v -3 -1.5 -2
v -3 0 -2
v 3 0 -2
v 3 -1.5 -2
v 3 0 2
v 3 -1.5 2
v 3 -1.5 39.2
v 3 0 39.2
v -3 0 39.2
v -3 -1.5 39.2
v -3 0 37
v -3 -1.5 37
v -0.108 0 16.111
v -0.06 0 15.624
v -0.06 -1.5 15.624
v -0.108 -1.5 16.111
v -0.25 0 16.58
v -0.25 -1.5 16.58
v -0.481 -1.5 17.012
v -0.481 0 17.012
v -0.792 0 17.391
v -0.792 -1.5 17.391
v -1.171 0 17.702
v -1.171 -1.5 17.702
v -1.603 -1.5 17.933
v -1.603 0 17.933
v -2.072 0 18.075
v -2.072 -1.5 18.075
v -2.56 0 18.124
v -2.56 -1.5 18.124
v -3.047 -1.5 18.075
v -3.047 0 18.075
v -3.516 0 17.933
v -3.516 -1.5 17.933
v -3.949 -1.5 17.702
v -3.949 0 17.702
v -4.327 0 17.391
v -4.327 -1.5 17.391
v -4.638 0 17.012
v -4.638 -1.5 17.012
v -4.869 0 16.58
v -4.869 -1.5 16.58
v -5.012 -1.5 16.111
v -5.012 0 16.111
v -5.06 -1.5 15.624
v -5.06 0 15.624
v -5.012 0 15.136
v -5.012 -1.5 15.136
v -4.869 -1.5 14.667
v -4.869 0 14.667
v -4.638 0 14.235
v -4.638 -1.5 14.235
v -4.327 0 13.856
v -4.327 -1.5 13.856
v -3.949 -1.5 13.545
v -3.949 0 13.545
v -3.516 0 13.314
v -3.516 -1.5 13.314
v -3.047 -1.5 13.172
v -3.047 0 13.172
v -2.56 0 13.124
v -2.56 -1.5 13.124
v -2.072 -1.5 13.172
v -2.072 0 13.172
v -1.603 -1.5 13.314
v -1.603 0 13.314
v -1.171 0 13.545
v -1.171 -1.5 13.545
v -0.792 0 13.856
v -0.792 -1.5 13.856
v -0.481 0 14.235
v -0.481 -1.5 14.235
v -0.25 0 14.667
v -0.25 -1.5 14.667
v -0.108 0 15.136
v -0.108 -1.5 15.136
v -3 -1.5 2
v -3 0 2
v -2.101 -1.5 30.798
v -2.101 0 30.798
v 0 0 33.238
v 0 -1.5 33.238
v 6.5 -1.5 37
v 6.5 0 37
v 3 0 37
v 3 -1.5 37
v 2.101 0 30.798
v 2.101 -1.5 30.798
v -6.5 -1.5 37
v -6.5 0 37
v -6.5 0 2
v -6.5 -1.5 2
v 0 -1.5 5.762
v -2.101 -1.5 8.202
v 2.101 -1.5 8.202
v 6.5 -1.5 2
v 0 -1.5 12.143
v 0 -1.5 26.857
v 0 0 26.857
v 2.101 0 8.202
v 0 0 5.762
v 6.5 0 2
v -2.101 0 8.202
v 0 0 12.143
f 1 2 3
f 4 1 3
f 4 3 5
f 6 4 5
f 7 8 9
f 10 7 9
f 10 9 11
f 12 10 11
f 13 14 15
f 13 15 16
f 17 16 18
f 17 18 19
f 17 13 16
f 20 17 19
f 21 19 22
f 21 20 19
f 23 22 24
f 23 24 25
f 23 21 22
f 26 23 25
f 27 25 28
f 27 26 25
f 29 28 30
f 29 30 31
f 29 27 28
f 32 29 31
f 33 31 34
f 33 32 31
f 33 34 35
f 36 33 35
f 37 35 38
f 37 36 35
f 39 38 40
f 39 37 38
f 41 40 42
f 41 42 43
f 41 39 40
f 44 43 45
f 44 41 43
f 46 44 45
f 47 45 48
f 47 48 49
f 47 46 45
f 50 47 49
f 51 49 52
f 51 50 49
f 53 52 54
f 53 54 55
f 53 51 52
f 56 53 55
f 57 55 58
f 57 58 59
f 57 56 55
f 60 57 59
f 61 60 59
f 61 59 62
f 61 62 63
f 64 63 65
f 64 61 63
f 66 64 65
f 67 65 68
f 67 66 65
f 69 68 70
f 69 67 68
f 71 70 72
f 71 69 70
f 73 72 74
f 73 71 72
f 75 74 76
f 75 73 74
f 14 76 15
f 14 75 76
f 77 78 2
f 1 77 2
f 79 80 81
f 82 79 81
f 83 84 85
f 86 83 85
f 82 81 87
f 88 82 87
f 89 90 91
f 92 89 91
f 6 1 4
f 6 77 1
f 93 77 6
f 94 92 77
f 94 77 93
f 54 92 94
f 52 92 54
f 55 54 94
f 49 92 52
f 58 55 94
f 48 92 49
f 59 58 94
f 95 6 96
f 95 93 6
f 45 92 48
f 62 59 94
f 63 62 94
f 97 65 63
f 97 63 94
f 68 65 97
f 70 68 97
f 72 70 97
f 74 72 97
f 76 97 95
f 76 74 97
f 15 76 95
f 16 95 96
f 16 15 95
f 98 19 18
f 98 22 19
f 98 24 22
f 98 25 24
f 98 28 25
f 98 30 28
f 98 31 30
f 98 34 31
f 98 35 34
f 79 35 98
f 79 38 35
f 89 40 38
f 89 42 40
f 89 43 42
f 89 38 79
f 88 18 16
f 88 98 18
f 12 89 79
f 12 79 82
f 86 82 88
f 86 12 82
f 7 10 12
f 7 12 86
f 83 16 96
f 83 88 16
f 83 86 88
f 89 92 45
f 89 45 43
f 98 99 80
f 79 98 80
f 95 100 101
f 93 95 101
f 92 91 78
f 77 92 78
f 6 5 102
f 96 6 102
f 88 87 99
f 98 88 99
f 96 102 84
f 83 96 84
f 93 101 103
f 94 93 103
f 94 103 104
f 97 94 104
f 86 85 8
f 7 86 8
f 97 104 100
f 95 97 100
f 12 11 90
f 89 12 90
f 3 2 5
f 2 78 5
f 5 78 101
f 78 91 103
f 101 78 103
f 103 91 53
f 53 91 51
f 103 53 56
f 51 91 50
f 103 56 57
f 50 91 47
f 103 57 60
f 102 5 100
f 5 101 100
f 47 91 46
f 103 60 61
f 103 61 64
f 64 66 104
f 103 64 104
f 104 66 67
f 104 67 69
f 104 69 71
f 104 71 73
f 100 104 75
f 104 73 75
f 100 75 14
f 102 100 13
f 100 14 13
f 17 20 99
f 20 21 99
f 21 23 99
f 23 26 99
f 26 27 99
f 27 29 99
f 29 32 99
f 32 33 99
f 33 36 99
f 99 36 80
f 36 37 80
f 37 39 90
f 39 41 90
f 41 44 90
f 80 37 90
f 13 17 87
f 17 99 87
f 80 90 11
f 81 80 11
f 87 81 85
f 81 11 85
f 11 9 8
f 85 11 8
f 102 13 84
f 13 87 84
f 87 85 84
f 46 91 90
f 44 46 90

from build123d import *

# Parameters (mm, degrees)
F0_R     = 2.5
F1_DEPTH = 1.5


with BuildPart() as f1:
    # F0 (on Front) → F1 (new body)
    with BuildSketch(Plane.XZ):
        Polygon((-3, -2), (3, -2), (3, 2), (6.5, 2), (6.5, 37), (3, 37), (3, 39.2), (0, 39.2), (-3, 39.2), (-3, 37), (-6.5, 37), (-6.5, 2), (-3, 2), align=None)
        with Locations((-2.559623, 15.623519)):
            Circle(F0_R, mode=Mode.SUBTRACT)
        Polygon((2.101456, 8.201567), (0, 5.761865), (-2.101456, 8.201567), (0, 12.142628), align=None, mode=Mode.SUBTRACT)
        Polygon((-2.101456, 30.798433), (0, 33.238135), (2.101456, 30.798433), (0, 26.857372), align=None, mode=Mode.SUBTRACT)
    extrude(amount=F1_DEPTH)


solid = f1.part
